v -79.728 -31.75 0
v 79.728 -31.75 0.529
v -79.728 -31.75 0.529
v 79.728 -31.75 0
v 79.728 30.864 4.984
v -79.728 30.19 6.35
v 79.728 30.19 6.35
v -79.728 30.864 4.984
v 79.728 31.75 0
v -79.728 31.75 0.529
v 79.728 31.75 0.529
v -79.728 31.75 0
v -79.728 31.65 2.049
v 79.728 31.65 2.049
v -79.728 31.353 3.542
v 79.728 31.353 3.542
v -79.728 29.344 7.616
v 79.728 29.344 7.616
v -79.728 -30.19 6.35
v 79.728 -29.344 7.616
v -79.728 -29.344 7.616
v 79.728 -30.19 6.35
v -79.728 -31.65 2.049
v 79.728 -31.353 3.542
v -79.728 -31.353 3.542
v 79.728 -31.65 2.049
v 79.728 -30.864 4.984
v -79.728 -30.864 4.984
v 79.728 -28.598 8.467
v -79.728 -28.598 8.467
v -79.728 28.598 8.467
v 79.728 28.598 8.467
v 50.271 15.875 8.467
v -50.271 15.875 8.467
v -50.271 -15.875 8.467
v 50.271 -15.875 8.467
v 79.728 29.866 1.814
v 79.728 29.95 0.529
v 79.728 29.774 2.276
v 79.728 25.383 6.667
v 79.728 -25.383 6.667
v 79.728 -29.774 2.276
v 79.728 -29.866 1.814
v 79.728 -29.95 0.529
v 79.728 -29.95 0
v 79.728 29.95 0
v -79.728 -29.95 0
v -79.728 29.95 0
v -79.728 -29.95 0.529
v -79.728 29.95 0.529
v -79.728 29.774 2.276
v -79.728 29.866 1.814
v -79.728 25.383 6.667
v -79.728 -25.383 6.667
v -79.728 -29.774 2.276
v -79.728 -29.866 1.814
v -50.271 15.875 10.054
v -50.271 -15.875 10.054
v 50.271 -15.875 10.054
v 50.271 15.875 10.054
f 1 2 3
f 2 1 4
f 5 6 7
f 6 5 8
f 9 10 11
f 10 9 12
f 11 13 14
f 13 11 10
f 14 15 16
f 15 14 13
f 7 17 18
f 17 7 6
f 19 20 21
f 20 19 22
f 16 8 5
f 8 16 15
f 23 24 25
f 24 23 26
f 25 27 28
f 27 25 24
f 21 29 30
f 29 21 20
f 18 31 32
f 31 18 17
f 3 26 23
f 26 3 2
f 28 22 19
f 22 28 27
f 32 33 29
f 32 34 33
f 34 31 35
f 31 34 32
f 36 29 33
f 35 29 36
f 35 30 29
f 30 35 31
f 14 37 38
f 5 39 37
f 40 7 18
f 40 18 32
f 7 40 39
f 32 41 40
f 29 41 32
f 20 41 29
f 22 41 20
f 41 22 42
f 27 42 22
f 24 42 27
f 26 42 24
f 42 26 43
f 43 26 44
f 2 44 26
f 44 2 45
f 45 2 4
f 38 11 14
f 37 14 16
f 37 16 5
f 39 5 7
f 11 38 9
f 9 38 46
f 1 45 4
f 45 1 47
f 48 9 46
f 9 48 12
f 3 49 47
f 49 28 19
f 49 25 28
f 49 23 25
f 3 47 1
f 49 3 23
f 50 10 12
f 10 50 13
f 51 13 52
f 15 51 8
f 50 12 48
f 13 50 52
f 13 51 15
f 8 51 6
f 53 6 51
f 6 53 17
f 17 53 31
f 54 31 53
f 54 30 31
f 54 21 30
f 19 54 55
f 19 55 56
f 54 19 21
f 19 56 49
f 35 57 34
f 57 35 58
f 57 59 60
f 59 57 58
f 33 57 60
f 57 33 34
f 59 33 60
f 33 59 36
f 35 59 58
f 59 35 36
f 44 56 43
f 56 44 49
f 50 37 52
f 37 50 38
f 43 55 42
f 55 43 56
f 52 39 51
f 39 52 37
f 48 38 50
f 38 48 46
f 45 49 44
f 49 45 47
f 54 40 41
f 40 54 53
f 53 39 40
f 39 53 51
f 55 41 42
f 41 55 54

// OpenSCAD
// Milwaukee Road Little Joe, O scale 1-48 - print 5 of 17: roof_2 - roof, section 2 (print upright)
// Render (F6), export STL, print. Settings: ../../library/lj_params.scad
// Whole loco preview and notes: ../../MILW_LittleJoe_Main.scad
SCALE_SEL = "O";
LOCO_SEL = "E70";   // [E20, E21, E70, E71, E72, E73, E74, E75, E76, E77, E78, E79] the body and roof change for E20 / E21
include <../../library/lj_all.scad>
lj_plate("roof_2");
